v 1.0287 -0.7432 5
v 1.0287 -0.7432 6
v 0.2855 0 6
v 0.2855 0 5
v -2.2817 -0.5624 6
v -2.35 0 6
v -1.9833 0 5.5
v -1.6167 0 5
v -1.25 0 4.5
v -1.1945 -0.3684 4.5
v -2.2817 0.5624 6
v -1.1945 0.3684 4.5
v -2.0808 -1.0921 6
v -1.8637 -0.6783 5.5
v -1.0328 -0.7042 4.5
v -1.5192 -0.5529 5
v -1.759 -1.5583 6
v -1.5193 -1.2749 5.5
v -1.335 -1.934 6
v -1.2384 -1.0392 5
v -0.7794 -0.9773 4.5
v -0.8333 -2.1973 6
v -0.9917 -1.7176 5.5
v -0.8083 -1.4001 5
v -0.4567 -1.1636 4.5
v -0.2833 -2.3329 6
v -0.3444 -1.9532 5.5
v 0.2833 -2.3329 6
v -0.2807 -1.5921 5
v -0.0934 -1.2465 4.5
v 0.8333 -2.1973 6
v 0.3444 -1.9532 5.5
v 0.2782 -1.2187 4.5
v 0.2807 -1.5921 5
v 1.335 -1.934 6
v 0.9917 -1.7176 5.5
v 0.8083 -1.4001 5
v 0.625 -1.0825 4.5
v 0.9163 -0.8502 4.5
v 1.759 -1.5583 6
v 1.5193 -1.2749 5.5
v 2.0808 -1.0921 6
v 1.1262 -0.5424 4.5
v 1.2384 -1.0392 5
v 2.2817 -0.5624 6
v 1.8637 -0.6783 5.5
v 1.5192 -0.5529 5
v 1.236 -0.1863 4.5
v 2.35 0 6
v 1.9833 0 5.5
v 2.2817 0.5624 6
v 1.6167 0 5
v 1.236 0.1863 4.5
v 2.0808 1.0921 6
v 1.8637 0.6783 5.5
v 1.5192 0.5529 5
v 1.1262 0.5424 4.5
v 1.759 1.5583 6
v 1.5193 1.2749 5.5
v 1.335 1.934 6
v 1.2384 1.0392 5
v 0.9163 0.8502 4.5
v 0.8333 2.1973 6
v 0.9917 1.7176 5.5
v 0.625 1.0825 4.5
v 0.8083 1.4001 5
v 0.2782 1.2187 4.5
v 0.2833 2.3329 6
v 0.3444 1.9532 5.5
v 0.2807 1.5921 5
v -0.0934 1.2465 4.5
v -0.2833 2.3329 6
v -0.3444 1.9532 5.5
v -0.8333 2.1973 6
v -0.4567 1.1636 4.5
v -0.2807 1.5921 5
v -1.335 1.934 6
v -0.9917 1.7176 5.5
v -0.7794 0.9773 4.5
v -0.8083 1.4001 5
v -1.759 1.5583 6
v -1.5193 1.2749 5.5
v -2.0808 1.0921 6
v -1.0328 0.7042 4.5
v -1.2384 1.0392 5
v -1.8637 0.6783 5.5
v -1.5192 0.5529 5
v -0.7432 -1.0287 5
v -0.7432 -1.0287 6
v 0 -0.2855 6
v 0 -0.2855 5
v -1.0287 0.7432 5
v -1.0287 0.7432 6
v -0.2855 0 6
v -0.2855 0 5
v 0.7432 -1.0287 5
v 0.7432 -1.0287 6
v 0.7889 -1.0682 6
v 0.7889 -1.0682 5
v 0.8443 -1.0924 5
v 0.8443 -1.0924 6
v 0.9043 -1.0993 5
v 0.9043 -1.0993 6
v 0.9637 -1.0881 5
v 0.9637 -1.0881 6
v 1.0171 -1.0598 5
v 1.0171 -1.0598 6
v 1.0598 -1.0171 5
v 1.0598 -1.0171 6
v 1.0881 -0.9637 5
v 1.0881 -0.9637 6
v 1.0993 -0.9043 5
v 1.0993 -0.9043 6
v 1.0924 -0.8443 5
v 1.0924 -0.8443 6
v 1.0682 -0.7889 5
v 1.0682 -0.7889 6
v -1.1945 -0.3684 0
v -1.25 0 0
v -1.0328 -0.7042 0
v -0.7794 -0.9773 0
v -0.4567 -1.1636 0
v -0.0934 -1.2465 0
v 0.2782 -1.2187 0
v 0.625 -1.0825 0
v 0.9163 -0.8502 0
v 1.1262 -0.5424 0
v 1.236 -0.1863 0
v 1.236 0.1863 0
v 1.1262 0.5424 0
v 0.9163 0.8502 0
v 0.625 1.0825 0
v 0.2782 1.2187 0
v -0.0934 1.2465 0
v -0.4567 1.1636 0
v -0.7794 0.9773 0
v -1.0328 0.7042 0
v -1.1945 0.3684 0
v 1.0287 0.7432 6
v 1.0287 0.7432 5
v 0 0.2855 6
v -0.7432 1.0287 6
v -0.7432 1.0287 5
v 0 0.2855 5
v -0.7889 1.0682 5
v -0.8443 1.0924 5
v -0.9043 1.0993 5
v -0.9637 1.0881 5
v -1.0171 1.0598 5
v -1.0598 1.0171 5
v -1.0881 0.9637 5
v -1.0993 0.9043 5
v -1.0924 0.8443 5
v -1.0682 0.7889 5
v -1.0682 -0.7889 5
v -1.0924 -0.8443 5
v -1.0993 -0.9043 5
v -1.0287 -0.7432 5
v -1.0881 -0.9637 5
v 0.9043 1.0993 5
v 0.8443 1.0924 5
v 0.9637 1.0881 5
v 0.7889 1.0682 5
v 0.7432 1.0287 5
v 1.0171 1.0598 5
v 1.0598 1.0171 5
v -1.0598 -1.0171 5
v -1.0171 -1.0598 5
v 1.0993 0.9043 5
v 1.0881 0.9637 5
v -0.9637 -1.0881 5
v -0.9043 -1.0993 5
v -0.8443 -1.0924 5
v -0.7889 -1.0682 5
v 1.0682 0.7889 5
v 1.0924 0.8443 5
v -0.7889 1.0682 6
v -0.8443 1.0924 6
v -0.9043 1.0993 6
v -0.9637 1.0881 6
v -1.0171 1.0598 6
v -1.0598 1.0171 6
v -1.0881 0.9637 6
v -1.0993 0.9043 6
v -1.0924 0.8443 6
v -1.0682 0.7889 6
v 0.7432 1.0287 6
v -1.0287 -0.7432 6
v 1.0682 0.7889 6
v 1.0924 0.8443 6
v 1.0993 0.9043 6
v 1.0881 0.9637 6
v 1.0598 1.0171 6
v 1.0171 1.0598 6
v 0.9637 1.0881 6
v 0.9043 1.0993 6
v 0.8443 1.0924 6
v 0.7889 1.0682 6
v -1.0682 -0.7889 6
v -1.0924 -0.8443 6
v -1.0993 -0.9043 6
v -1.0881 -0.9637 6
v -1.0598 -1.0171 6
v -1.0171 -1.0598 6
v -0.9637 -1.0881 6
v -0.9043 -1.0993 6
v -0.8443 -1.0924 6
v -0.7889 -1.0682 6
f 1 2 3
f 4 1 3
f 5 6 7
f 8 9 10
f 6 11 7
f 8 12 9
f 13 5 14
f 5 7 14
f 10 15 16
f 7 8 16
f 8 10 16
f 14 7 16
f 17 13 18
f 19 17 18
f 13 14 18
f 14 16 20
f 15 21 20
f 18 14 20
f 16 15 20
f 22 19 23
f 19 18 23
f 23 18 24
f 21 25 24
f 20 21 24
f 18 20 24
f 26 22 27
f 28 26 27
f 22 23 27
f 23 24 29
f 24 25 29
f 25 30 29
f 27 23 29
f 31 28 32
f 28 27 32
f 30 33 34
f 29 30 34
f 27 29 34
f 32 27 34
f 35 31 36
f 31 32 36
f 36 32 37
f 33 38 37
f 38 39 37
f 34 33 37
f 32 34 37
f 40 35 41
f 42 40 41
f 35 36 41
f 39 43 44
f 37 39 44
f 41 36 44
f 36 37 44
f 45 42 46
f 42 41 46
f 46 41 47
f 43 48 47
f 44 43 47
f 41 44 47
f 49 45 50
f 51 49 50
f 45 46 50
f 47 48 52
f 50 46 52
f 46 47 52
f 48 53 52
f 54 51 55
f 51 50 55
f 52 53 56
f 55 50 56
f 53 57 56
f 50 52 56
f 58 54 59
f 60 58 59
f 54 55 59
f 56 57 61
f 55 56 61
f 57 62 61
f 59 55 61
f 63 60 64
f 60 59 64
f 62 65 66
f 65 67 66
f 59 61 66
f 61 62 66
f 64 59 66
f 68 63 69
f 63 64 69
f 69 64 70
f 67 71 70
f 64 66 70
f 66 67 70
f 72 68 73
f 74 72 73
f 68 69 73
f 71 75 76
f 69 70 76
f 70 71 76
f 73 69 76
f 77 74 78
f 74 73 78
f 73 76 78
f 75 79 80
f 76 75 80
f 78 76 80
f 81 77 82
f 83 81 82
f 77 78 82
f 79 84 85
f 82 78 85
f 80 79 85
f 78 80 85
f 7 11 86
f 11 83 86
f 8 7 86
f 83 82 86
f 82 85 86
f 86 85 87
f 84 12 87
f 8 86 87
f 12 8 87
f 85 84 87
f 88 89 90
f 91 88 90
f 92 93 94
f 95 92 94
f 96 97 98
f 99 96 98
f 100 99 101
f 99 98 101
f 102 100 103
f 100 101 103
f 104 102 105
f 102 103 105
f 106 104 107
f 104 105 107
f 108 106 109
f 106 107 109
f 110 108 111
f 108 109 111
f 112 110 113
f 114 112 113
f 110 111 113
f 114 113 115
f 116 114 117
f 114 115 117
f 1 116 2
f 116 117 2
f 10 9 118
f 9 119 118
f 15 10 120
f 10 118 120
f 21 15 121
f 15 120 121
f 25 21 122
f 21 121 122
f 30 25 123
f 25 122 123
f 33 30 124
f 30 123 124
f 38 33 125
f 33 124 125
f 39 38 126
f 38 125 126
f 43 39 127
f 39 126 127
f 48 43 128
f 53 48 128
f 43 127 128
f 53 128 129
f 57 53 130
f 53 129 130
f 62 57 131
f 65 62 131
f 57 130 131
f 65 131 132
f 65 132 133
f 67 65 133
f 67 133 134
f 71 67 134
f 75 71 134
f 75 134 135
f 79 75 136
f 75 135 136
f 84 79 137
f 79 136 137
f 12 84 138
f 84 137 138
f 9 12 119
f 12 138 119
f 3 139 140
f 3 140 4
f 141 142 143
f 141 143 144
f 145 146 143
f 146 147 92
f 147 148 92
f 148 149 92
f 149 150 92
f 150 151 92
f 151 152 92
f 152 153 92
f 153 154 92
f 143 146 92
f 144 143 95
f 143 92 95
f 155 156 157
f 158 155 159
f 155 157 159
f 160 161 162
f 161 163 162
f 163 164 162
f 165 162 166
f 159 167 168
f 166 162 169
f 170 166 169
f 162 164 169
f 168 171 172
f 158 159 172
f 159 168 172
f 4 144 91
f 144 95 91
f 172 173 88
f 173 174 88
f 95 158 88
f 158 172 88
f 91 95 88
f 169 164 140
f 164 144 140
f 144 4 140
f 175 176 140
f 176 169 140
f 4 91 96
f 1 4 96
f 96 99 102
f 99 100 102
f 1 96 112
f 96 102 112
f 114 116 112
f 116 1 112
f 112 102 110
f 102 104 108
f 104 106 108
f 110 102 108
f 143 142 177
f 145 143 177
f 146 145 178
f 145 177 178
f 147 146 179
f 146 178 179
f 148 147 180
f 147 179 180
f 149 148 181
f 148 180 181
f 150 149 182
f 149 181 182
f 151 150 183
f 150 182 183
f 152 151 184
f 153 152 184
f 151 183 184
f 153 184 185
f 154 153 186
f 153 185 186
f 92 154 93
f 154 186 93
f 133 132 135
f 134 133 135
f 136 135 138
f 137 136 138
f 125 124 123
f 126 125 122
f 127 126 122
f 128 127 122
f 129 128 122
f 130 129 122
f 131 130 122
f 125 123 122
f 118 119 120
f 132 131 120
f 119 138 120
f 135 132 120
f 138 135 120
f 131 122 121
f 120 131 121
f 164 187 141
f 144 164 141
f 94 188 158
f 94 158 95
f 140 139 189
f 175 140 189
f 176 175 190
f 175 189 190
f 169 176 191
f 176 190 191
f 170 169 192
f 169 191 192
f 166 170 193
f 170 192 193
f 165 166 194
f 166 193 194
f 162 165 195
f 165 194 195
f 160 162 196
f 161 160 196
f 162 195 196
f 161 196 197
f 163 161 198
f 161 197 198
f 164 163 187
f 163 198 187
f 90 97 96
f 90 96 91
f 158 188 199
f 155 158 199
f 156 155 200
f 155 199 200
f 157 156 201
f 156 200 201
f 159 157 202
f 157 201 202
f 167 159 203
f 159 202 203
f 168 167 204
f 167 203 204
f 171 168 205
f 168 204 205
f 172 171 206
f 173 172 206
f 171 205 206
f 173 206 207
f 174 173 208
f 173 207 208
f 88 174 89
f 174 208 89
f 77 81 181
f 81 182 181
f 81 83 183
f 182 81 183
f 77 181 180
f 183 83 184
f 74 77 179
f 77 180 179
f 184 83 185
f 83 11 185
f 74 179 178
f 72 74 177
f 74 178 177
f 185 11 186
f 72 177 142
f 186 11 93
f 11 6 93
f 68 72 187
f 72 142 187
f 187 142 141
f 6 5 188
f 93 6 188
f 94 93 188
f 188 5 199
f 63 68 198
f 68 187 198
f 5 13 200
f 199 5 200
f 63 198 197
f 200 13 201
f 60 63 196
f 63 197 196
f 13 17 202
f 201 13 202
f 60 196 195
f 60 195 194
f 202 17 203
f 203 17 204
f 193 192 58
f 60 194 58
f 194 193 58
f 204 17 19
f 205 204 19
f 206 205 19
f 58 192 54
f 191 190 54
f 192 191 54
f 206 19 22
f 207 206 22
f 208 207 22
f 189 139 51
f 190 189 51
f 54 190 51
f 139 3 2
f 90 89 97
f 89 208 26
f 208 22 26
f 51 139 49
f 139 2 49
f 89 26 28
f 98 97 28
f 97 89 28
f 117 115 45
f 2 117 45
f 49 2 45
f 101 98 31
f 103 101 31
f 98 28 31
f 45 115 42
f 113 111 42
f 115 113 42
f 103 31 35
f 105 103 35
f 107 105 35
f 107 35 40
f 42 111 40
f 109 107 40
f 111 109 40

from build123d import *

# Parameters (mm, degrees)
POCKET_DEPTH = 1


with BuildPart() as part:
    # Sketch → Revolution (revolve)
    with BuildSketch(Plane.XZ):
        Polygon((0, 6), (-2.35, 6), (-1.25, 4.5), (-1.25, 0), (0, 0), align=None)
    revolve(axis=Axis((0, 0, 0), (0, 0, 1)))

    # Sketch001 (on Face1 of Revolution) → Pocket (cut)
    with BuildSketch(Plane(origin=(0, 0, 6), x_dir=(-1, 0, 0), z_dir=(0, 0, 1))):
        with BuildLine():
            Line((-0.74321, 1.028714), (0, 0.285504))
            Line((0.74321, 1.028714), (0, 0.285504))
            ThreePointArc((1.028714, 0.74321), (1.040084, 1.040084), (0.74321, 1.028714))
            Line((1.028714, 0.74321), (0.285504, 0))
            Line((1.028714, -0.74321), (0.285504, 0))
            ThreePointArc((0.74321, -1.028714), (1.040084, -1.040084), (1.028714, -0.74321))
            Line((0.74321, -1.028714), (0, -0.285504))
            Line((-0.74321, -1.028714), (0, -0.285504))
            ThreePointArc((-1.028714, -0.74321), (-1.040084, -1.040084), (-0.74321, -1.028714))
            Line((-1.028714, -0.74321), (-0.285504, 0))
            Line((-1.028714, 0.74321), (-0.285504, 0))
            ThreePointArc((-0.74321, 1.028714), (-1.040084, 1.040084), (-1.028714, 0.74321))
        make_face()
    extrude(amount=-POCKET_DEPTH, mode=Mode.SUBTRACT)


solid = part.part
